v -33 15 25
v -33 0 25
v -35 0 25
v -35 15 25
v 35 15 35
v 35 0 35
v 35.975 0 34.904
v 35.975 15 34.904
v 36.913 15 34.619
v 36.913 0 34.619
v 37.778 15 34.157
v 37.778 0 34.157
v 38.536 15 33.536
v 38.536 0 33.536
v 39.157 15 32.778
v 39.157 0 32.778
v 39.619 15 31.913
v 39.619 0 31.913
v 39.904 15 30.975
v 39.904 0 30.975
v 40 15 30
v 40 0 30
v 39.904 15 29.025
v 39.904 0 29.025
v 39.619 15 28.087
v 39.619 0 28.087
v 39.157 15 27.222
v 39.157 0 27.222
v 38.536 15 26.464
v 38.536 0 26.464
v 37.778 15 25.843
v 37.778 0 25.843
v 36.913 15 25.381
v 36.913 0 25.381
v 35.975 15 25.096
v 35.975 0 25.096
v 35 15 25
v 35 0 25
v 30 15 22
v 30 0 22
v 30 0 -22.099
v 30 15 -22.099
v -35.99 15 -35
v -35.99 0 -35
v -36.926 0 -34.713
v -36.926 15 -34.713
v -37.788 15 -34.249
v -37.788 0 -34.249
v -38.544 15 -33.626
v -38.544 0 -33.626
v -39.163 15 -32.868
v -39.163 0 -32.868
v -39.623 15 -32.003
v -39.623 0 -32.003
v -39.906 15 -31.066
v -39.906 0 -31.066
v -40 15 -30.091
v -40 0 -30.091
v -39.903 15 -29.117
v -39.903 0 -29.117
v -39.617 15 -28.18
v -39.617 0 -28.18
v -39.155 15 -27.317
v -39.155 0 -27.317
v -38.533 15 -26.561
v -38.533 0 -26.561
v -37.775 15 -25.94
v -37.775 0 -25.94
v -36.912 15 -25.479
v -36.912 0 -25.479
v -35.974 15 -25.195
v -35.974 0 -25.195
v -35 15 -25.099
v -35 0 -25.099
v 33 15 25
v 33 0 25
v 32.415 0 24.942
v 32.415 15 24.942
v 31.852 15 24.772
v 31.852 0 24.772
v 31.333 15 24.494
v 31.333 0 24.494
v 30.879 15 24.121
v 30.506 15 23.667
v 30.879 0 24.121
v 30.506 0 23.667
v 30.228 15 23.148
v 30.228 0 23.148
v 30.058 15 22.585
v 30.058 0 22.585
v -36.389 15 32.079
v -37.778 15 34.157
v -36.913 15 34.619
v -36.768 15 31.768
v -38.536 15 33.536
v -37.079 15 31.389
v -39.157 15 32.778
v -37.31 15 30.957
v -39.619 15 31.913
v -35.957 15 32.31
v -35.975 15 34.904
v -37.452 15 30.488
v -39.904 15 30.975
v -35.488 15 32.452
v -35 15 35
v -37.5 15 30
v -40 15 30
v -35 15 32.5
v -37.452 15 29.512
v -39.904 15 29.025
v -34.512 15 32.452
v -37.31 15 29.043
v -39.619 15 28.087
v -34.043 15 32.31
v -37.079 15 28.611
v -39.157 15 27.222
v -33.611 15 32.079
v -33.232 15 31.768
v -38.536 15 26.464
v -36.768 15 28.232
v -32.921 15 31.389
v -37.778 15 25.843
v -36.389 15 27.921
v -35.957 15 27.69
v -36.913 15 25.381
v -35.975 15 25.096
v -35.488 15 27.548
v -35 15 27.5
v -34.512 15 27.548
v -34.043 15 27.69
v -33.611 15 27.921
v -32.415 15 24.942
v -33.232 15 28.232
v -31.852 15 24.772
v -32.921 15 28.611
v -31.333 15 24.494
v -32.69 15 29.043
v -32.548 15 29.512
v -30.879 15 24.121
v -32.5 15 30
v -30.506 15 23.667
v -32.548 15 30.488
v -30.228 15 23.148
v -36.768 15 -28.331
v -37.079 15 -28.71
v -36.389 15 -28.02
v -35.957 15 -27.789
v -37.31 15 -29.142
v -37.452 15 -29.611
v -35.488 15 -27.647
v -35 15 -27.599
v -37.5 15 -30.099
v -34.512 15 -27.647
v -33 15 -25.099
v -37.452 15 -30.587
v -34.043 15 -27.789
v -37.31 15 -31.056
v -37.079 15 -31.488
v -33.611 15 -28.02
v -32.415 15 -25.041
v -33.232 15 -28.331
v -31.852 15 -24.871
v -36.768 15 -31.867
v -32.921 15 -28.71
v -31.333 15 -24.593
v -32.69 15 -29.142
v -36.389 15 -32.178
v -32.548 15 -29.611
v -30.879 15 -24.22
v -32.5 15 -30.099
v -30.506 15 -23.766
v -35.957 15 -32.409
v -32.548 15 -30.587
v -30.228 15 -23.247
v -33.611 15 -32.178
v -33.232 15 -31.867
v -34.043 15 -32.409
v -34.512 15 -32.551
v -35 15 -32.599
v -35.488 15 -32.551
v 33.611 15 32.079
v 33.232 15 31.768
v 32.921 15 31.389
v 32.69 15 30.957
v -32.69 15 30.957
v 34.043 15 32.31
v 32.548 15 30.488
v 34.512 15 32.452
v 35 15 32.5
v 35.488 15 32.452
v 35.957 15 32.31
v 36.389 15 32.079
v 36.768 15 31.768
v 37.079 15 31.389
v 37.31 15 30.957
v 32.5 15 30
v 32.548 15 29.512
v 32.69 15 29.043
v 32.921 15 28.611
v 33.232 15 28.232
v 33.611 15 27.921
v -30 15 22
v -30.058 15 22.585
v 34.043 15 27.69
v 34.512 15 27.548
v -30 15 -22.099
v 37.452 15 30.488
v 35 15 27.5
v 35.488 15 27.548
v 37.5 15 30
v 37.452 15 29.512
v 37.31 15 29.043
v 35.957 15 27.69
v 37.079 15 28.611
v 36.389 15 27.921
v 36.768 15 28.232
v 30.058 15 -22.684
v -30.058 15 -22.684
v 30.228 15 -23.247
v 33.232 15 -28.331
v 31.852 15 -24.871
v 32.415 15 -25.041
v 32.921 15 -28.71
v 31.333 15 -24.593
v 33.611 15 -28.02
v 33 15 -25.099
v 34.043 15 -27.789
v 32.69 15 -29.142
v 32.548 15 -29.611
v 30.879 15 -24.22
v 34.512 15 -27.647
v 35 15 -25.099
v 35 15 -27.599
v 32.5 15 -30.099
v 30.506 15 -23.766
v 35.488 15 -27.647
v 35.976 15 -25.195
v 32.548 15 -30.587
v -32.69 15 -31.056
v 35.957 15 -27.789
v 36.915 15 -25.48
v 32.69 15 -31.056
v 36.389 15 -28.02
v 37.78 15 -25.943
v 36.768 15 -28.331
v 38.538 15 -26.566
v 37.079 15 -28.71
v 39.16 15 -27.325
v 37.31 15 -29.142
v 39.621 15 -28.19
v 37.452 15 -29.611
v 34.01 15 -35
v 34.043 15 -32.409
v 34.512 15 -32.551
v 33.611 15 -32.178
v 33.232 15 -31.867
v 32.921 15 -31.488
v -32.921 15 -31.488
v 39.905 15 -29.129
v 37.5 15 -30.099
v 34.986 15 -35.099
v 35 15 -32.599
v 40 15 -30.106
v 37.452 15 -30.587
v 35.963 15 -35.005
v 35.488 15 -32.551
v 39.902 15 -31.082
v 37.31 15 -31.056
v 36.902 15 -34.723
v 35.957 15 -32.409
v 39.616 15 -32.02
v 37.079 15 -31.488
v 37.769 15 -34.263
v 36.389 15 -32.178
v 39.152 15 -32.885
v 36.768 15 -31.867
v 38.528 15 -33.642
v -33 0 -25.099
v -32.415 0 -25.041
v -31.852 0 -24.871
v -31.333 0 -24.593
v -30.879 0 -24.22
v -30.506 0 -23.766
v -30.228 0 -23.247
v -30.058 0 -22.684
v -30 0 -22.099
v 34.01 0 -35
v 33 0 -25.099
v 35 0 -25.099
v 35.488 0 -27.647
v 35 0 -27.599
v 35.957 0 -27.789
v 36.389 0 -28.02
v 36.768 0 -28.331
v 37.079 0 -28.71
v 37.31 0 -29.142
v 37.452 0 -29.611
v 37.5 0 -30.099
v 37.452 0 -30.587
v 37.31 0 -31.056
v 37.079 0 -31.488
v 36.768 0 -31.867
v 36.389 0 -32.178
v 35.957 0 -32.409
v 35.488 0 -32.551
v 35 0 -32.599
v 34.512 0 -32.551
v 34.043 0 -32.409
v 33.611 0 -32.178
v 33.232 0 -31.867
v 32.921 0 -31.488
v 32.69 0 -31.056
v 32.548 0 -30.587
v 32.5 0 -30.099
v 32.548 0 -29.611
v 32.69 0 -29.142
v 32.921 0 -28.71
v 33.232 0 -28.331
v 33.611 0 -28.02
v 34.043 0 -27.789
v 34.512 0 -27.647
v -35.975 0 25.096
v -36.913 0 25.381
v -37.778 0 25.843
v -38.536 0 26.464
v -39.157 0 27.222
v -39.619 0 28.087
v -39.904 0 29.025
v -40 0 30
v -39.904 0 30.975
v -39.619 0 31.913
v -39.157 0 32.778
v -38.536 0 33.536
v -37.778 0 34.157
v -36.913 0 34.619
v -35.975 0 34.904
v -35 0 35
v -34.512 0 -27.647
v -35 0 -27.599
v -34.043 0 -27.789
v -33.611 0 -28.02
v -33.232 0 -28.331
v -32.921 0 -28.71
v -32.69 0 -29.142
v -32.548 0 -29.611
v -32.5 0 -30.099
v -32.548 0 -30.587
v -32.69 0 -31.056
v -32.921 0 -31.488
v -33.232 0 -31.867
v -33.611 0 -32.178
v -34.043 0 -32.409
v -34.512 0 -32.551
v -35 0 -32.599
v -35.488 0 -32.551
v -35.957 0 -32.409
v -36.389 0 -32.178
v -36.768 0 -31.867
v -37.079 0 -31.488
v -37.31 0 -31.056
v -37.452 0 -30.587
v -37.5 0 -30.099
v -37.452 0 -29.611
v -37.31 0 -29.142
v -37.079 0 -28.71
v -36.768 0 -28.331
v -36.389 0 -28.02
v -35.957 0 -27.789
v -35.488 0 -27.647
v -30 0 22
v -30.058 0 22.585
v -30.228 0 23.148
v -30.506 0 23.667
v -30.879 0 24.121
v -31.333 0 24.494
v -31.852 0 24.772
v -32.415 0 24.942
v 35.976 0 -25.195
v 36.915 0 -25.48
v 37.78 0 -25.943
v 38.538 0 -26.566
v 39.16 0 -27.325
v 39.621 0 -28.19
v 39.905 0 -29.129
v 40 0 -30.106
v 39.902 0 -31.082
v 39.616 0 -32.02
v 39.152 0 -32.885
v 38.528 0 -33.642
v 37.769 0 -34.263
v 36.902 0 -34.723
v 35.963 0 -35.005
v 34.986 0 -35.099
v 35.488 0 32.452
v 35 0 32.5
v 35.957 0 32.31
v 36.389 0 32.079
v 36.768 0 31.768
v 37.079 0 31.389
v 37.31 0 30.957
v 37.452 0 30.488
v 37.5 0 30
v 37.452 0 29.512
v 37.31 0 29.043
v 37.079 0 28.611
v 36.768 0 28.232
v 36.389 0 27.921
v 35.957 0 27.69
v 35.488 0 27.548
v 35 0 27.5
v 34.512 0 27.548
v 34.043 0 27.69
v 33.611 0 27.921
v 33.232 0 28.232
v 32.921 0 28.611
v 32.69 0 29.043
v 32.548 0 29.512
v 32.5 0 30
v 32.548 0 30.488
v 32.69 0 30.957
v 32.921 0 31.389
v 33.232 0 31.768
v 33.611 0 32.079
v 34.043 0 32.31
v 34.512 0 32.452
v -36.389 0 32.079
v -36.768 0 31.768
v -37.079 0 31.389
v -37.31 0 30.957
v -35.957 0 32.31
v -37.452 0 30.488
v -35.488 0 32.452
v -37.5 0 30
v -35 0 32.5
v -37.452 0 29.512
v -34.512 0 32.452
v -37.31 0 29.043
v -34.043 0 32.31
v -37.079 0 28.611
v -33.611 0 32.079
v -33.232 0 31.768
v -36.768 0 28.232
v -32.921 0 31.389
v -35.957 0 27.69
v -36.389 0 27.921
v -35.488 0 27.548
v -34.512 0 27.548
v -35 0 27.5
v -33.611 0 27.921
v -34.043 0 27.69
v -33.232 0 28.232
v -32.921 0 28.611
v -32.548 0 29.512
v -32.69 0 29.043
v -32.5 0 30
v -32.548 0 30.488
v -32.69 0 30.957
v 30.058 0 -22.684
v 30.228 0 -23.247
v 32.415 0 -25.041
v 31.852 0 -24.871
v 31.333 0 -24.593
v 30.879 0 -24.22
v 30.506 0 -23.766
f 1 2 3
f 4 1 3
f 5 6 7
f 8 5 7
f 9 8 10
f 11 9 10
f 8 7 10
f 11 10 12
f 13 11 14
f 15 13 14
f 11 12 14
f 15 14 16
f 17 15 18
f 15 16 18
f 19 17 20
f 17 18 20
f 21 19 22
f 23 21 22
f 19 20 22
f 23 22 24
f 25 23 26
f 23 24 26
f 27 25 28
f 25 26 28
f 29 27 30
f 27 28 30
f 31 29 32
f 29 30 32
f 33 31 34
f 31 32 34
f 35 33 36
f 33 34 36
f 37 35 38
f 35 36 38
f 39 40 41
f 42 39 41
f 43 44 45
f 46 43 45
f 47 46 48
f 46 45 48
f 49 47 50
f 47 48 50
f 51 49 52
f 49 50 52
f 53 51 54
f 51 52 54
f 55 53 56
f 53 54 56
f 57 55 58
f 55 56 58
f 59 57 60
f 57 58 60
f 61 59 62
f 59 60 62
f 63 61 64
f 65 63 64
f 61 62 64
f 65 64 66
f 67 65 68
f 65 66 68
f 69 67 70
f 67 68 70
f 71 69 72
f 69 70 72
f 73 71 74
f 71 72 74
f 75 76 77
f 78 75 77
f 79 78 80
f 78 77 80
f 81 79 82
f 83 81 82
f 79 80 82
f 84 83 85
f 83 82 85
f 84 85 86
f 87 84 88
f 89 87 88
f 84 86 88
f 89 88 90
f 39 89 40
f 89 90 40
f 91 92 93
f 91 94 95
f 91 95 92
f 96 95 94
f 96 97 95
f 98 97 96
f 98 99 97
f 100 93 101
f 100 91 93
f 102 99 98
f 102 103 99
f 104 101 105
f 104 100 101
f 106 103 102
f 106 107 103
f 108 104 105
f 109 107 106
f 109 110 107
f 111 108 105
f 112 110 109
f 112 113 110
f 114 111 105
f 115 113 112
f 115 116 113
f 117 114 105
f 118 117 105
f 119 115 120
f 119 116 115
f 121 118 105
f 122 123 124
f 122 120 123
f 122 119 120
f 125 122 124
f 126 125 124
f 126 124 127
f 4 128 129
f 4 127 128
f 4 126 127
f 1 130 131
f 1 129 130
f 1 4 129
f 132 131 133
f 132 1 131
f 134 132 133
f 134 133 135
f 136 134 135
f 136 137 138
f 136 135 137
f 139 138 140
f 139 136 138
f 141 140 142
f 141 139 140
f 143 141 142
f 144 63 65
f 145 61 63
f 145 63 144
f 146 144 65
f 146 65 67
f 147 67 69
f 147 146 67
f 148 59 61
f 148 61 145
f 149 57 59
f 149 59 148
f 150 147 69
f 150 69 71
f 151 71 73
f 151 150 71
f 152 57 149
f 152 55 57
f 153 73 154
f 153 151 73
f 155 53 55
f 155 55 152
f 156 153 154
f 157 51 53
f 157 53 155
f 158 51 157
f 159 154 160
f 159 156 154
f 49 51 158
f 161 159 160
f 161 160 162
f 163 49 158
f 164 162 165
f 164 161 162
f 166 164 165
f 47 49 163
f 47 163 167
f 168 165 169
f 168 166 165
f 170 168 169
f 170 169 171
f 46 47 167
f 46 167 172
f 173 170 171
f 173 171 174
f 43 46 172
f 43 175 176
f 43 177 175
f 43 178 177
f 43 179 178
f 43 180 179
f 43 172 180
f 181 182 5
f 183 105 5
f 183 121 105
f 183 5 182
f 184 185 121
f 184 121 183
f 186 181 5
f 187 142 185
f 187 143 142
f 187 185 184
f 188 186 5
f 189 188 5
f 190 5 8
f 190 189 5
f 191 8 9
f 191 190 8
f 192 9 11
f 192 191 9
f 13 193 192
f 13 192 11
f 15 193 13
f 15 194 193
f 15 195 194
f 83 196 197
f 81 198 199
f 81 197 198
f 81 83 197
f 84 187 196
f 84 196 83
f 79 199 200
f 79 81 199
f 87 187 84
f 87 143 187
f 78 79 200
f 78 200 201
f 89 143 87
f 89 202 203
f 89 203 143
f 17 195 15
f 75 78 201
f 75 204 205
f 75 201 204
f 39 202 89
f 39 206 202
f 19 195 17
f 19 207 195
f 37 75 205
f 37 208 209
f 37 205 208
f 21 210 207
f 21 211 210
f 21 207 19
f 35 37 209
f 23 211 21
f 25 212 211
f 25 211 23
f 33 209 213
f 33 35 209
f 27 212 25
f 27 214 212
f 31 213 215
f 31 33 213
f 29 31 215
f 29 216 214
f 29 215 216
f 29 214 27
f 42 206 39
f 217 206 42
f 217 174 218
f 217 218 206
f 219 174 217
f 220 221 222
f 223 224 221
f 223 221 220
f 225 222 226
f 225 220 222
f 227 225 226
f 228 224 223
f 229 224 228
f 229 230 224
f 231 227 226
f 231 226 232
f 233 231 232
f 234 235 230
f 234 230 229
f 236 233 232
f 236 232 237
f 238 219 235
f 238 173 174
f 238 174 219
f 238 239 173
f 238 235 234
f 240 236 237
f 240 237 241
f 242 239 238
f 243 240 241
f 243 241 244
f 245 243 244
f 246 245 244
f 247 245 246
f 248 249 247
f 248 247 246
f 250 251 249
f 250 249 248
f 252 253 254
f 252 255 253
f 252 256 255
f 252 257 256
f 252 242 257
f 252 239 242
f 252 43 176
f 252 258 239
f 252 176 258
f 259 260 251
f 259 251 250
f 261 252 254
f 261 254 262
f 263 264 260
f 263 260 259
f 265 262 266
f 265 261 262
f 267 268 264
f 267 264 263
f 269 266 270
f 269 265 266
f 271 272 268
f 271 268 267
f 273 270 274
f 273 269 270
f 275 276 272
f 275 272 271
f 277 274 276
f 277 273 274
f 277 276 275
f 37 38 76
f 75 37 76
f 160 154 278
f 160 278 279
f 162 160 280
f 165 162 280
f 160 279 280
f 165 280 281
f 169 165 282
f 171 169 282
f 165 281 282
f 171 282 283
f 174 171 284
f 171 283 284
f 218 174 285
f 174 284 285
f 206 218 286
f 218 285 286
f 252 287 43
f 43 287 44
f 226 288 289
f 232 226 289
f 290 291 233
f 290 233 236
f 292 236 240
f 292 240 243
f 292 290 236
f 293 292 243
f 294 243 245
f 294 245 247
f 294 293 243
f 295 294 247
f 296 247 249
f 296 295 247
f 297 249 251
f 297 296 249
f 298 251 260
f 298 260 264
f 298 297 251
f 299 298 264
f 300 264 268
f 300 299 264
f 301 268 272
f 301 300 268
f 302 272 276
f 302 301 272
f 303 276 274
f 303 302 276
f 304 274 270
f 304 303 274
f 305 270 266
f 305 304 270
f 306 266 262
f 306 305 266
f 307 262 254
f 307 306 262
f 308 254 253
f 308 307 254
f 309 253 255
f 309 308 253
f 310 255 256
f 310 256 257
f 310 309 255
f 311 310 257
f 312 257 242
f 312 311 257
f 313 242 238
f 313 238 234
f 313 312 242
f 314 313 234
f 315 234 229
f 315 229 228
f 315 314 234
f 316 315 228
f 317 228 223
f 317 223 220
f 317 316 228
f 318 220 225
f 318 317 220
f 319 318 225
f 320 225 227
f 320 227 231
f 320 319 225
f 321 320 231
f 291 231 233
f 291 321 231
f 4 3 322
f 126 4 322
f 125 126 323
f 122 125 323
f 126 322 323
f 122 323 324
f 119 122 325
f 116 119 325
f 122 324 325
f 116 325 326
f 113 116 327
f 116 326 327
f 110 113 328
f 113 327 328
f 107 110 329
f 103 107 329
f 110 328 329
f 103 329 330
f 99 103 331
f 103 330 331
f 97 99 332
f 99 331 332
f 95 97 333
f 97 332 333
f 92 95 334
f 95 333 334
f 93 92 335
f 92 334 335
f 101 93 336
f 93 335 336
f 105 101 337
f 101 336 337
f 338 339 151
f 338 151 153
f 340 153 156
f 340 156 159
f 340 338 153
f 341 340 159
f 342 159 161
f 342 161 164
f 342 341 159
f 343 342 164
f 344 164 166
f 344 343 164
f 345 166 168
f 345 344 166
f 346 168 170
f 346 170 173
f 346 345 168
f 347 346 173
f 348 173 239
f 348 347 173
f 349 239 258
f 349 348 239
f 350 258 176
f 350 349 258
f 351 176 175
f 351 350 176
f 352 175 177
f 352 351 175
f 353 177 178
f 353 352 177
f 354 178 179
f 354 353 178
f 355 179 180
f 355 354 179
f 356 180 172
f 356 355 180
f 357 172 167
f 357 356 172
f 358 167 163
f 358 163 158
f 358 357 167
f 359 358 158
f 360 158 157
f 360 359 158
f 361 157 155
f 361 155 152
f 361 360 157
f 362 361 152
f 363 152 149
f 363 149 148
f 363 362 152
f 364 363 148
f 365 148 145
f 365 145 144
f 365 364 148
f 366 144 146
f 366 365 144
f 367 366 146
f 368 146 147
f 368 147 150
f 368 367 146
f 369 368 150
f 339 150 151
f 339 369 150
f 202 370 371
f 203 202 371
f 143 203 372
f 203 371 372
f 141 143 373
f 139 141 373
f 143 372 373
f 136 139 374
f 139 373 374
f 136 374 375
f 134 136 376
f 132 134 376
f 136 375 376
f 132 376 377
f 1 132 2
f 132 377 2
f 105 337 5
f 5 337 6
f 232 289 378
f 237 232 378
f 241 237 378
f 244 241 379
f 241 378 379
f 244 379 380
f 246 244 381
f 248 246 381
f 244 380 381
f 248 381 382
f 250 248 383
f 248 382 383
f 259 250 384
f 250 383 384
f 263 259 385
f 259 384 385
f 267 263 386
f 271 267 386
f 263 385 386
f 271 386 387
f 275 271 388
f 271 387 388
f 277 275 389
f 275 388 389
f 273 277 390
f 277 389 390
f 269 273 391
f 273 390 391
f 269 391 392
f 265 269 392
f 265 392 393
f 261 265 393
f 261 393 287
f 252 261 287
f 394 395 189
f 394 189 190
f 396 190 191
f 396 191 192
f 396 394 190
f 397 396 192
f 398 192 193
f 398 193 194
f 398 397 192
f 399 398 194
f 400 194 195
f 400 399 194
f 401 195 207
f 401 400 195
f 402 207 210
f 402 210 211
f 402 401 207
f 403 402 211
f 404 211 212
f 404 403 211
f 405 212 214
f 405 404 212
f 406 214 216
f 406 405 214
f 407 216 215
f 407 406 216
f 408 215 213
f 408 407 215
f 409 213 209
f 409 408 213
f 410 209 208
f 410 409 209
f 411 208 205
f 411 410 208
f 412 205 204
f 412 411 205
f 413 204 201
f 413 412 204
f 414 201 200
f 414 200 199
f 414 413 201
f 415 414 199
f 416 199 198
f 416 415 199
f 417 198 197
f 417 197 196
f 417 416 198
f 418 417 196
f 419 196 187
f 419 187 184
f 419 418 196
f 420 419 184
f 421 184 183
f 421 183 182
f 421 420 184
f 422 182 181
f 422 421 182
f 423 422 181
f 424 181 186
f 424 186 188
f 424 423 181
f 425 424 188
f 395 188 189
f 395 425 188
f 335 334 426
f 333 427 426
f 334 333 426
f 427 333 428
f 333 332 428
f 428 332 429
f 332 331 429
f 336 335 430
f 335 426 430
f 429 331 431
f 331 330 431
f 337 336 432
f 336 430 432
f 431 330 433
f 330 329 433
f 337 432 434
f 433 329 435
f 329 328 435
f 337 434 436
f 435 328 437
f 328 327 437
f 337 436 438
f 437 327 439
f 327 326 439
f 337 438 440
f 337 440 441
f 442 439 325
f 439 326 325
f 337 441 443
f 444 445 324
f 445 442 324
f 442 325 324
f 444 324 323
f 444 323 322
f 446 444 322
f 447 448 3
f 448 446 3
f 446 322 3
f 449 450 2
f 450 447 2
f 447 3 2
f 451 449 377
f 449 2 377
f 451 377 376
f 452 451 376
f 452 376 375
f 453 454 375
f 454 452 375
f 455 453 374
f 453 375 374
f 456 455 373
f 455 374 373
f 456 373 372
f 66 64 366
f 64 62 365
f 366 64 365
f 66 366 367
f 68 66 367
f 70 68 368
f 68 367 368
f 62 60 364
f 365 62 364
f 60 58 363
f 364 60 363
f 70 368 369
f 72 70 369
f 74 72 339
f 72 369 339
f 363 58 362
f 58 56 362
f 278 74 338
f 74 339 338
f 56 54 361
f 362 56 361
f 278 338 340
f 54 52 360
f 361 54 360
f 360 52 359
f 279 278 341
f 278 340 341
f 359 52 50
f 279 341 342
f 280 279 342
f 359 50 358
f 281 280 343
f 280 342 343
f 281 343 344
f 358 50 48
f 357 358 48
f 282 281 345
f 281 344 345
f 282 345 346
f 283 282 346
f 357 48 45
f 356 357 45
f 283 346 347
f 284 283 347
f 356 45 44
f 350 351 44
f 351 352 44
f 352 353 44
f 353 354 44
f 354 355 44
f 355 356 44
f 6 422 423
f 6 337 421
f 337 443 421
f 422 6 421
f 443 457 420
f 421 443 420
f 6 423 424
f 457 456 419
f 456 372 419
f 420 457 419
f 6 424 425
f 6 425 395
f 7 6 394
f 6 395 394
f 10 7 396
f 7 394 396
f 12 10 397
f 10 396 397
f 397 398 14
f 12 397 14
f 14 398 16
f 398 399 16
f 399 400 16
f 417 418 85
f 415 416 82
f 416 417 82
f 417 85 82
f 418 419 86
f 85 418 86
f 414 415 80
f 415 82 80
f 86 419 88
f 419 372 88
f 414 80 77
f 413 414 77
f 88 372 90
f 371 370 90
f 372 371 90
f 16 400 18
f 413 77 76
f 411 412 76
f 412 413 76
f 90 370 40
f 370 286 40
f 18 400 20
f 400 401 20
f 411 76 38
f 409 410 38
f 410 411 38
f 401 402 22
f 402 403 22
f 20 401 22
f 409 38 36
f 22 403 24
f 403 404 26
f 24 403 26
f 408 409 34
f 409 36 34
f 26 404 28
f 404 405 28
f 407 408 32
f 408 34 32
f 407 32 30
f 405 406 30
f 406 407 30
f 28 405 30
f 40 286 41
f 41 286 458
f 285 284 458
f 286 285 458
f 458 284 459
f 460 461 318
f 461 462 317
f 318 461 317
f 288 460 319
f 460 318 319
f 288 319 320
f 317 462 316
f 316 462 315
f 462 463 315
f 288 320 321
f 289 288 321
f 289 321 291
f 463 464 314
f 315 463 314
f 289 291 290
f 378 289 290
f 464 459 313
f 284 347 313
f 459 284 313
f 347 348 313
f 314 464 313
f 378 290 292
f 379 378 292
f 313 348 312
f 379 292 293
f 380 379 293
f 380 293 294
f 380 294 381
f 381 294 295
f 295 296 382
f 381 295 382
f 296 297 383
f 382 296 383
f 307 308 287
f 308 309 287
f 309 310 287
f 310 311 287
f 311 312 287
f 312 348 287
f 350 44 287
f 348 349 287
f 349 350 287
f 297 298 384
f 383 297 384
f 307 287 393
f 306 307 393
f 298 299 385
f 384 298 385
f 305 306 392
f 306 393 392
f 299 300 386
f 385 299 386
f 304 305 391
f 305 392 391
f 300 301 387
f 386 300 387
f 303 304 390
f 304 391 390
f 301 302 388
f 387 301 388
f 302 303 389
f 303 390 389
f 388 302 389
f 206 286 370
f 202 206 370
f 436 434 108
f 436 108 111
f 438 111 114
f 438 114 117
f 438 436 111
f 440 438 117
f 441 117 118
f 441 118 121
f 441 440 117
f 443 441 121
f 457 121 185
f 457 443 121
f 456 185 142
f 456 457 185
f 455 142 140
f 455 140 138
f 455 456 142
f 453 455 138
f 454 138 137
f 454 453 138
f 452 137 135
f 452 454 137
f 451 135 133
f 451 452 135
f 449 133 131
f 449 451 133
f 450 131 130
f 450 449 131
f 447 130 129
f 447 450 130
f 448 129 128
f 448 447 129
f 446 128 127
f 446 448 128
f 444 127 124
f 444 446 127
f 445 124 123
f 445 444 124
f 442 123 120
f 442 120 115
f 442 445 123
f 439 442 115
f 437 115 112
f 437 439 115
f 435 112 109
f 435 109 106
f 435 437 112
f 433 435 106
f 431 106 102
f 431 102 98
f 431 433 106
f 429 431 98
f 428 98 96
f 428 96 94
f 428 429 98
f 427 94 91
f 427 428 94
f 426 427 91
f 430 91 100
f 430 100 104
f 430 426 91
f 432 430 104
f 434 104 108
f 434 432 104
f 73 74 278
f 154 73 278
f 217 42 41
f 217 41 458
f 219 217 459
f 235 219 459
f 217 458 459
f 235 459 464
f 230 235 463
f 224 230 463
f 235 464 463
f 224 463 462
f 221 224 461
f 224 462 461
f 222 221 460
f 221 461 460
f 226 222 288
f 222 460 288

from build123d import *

# Parameters (mm, degrees)
SKETCH1_R           = 2.5
BOSS_EXTRUDE1_DEPTH = 15


with BuildPart() as part:
    # Sketch1 → Boss-Extrude1 (new body)
    with BuildSketch(Plane(origin=(0, 0, 0), x_dir=(1, 0, 0), z_dir=(0, 1, 0))):
        with BuildLine():
            Line((-30, -35), (30, -35))
            Line((30, -35), (35, -35))
            ThreePointArc((35, -35), (40, -30), (35, -25))
            Line((35, -25), (33, -25))
            ThreePointArc((33, -25), (30.878679656, -24.121320344), (30, -22))
            Line((30, -22), (30, 22.098959323))
            ThreePointArc((30, 22.098959323), (30.878679656, 24.220279667), (33, 25.098959323))
            Line((33, 25.098959323), (35, 25.098959323))
            ThreePointArc((35, 25.098959323), (39.975198659, 30.596350827), (34.010151382, 35))
            Line((34.010151382, 35), (30, 35))
            Line((30, 35), (-30, 35))
            Line((-30, 35), (-35.989848618, 35))
            ThreePointArc((-35.989848618, 35), (-39.975198659, 29.601567819), (-35, 25.098959323))
            Line((-35, 25.098959323), (-33, 25.098959323))
            ThreePointArc((-33, 25.098959323), (-30.878679656, 24.220279667), (-30, 22.098959323))
            Line((-30, 22.098959323), (-30, -22))
            ThreePointArc((-30, -22), (-30.878679656, -24.121320344), (-33, -25))
            Line((-33, -25), (-35, -25))
            ThreePointArc((-35, -25), (-40, -30), (-35, -35))
            Line((-35, -35), (-30, -35))
        make_face()
        with Locations(Location((-35, 30.098959323, 0), (0, 0, 270))):
            Circle(SKETCH1_R, mode=Mode.SUBTRACT)
        with Locations(Location((35, 30.098959323, 0), (0, 0, 270))):
            Circle(SKETCH1_R, mode=Mode.SUBTRACT)
        with Locations(Location((35, -30, 0), (0, 0, 270))):
            Circle(SKETCH1_R, mode=Mode.SUBTRACT)
        with Locations(Location((-35, -30, 0), (0, 0, 270))):
            Circle(SKETCH1_R, mode=Mode.SUBTRACT)
    extrude(amount=BOSS_EXTRUDE1_DEPTH)


solid = part.part
